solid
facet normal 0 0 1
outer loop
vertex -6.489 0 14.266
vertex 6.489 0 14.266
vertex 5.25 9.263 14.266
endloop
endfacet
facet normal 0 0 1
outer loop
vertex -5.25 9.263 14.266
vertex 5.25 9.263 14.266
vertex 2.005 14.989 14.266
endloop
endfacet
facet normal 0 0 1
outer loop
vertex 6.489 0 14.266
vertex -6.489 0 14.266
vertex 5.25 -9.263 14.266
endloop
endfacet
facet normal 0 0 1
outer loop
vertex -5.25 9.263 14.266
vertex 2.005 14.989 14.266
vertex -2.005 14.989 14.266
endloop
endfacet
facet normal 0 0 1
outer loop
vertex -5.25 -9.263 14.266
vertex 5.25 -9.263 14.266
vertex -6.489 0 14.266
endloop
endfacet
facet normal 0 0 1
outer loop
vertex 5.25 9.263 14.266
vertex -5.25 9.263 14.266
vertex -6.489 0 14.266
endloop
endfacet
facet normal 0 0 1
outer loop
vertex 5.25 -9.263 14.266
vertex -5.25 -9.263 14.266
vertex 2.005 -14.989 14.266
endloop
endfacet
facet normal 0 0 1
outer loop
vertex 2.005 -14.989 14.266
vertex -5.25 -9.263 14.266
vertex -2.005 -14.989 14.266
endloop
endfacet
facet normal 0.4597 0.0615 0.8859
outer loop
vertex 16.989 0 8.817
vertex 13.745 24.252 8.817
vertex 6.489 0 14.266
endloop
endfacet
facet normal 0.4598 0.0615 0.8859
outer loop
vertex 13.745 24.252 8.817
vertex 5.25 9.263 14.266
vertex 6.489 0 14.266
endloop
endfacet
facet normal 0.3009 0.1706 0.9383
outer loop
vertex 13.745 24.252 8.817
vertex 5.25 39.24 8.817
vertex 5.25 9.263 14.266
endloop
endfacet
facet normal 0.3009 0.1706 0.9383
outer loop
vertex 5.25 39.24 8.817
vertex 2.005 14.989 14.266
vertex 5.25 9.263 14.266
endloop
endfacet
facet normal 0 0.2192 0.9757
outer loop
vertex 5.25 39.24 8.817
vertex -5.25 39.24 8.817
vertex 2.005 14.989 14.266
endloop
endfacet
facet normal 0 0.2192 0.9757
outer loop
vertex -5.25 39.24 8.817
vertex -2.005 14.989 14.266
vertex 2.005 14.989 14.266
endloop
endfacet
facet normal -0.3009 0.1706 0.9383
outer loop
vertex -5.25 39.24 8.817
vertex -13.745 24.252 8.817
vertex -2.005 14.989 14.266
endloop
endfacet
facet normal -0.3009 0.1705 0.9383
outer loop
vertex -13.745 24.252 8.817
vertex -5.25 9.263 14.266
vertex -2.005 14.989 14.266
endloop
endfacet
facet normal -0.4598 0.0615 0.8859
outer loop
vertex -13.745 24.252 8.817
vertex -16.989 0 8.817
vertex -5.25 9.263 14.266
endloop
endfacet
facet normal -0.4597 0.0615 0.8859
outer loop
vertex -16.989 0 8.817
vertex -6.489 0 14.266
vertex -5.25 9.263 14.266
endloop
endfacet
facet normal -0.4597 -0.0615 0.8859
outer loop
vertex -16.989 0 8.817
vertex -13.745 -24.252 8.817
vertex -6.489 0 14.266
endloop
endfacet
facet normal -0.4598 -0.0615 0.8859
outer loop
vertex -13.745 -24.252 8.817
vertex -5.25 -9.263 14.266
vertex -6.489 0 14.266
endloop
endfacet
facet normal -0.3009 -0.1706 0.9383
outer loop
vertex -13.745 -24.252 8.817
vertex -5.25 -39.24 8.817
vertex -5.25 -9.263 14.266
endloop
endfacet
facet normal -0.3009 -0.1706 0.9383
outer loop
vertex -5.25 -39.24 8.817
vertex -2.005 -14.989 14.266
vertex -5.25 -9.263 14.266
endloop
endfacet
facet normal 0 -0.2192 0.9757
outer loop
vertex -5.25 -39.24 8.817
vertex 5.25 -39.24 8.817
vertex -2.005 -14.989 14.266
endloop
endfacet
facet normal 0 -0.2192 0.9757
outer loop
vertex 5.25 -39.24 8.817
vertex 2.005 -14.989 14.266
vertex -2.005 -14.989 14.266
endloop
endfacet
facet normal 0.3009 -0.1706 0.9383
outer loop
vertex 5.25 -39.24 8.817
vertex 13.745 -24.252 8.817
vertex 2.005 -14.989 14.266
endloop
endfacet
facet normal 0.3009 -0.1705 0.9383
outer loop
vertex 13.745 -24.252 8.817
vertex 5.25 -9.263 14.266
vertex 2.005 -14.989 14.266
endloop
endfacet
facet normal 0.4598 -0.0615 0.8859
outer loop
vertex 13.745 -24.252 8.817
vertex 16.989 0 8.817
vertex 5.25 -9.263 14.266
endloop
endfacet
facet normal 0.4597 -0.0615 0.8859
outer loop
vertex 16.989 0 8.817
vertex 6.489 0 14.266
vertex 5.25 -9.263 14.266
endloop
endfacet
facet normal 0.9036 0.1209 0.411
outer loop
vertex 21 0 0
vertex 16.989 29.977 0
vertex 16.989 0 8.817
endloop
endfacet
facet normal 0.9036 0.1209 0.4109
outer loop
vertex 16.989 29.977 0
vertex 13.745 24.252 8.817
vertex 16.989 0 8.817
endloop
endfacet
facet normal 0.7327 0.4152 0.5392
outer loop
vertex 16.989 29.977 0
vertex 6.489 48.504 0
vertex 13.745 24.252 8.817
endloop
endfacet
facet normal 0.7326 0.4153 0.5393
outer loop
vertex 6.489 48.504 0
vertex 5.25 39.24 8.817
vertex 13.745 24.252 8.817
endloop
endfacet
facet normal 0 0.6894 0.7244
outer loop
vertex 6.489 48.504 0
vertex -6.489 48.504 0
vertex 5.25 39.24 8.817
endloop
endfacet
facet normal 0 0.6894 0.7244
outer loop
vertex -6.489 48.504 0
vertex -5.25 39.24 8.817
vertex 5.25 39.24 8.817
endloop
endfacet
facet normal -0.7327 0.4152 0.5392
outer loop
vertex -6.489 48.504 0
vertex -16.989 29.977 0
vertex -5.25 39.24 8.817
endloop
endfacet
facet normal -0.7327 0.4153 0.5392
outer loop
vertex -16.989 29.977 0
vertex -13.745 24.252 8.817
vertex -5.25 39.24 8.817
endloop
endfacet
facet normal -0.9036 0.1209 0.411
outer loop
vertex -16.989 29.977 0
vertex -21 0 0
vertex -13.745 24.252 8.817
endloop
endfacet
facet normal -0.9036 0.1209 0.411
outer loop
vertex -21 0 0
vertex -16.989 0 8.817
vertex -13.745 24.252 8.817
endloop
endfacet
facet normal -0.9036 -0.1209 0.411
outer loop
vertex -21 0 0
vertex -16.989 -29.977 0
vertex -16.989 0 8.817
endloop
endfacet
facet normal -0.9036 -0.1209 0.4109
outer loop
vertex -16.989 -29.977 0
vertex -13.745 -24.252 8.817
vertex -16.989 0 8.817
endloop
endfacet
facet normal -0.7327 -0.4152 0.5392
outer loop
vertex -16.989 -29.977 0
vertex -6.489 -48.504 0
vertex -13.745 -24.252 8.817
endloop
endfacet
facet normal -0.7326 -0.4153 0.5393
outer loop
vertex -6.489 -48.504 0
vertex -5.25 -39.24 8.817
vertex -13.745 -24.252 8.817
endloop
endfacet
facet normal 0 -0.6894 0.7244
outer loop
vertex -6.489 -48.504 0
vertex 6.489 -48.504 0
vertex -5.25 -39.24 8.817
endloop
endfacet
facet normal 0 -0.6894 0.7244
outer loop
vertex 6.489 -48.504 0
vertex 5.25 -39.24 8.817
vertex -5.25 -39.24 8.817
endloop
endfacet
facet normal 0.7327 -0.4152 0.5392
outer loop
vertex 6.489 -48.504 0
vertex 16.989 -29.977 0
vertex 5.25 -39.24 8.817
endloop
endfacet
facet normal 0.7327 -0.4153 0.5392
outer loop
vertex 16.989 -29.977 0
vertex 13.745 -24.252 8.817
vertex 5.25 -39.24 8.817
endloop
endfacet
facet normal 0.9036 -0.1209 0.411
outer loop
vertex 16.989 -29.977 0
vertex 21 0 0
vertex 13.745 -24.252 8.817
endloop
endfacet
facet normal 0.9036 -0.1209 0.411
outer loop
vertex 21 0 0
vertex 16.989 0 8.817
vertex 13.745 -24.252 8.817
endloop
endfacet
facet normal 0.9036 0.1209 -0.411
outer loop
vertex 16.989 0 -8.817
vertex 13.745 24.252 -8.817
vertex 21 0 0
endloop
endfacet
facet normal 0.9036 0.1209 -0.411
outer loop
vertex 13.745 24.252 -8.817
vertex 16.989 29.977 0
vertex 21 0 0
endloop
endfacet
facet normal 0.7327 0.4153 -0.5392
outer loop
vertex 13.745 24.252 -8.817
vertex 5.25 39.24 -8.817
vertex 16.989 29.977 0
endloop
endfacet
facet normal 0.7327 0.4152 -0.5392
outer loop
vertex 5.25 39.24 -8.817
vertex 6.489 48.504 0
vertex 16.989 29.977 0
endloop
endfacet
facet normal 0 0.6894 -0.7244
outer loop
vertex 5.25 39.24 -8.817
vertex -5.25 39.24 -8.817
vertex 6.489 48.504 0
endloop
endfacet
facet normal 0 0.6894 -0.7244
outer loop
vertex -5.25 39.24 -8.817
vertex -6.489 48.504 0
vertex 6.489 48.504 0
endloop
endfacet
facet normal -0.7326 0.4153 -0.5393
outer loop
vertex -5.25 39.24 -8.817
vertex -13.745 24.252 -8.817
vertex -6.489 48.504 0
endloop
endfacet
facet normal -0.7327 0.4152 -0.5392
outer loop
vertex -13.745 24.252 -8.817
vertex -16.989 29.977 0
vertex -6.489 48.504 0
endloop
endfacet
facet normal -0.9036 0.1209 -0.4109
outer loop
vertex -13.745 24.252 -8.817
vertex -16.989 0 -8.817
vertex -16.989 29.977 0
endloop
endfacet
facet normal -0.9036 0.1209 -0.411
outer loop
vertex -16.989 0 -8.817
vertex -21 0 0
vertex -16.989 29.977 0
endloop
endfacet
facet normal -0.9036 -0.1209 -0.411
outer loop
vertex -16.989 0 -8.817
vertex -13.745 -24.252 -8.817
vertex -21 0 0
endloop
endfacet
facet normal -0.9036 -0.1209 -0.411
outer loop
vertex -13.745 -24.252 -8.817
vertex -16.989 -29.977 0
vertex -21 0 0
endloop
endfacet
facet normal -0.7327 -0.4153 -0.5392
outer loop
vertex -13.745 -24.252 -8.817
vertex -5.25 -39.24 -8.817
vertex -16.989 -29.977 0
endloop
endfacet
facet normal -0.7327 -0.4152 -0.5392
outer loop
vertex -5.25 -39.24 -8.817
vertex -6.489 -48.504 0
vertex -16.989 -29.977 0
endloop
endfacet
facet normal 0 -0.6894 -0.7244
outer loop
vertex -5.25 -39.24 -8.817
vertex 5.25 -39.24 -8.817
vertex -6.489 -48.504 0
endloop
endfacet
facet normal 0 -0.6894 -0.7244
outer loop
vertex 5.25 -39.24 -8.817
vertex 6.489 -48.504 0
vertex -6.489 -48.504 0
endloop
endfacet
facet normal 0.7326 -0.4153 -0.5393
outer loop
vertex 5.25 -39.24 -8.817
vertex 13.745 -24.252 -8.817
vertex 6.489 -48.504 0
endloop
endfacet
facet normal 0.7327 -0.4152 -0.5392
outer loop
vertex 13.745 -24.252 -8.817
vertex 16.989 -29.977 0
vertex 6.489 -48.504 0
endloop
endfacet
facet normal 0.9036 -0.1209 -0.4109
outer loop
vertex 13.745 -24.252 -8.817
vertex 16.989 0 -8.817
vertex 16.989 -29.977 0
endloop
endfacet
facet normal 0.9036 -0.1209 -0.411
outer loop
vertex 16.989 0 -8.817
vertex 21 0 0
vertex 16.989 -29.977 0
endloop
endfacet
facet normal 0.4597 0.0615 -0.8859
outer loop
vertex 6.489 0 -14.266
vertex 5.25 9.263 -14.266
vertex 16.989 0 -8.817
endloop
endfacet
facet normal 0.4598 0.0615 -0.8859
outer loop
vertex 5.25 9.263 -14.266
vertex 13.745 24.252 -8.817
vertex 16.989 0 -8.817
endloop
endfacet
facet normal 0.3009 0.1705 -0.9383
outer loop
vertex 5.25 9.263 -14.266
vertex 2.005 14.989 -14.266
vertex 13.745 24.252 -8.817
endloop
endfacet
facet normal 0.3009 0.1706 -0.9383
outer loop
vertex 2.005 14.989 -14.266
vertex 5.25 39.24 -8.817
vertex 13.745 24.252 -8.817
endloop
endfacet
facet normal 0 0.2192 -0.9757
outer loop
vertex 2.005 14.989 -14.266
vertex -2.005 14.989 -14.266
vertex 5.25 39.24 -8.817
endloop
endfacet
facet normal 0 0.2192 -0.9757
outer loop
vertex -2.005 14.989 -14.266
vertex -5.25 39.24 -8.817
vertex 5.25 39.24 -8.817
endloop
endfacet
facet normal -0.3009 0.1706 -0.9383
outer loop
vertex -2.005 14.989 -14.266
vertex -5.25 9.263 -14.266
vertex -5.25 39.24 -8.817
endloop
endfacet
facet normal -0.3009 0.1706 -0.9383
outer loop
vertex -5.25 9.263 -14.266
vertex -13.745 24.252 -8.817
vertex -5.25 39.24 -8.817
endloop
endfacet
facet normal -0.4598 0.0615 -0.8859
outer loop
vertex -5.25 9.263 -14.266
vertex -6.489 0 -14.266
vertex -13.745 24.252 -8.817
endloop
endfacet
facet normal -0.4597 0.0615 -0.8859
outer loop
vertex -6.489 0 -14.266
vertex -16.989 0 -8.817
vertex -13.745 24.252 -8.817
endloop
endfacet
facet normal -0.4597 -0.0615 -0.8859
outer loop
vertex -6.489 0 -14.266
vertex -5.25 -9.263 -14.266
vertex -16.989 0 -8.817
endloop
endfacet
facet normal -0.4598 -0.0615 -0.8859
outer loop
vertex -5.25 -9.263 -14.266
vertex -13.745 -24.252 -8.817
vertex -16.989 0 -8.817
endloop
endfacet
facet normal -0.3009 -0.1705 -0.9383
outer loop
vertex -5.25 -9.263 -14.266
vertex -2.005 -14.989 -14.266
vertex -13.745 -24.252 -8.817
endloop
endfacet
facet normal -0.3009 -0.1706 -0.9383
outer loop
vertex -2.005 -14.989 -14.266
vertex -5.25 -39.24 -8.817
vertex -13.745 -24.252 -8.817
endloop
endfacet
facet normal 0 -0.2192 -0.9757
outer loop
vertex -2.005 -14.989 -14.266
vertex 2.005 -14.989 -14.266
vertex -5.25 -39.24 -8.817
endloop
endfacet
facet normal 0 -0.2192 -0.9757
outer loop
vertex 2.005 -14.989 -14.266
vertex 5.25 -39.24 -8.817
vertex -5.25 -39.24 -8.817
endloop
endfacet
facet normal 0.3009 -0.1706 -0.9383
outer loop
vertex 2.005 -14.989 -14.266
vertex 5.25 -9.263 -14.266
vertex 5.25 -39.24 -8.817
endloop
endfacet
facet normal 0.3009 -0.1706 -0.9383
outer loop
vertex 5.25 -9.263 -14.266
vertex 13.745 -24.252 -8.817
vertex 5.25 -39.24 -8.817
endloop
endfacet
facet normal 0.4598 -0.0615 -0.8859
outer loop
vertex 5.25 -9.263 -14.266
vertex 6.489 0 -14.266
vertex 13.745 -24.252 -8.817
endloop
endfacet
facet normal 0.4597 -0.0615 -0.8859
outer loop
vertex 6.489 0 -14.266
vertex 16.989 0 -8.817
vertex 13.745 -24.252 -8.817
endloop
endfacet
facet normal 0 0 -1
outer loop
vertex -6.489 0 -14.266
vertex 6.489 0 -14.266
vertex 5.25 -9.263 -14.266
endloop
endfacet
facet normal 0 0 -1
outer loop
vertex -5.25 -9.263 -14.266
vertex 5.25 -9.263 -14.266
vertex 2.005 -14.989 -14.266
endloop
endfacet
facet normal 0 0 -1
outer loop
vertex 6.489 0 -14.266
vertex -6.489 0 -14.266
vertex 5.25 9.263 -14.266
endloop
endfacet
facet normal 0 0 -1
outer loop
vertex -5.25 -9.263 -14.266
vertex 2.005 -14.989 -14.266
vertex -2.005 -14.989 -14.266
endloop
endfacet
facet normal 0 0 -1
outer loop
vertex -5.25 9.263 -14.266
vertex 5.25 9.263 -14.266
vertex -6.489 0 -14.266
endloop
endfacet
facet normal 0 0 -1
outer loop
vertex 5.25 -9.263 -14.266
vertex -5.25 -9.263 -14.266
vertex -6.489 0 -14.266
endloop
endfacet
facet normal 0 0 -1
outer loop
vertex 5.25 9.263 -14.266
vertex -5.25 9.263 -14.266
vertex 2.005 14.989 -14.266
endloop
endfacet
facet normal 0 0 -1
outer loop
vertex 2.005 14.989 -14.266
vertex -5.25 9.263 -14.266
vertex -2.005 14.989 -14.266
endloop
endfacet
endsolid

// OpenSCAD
// Generated by SolidPython 1.0.1 on 2020-07-29 00:46:48


scale(v = [7, 17, 5]) {
	sphere(r = 3);
}
/***********************************************
*********      SolidPython code:      **********
************************************************
 
# import packages: SolidPython
from solid import *
from solid.utils import *
from itertools import chain, combinations, permutations


class Resize:

    def __init__(self, scad_file):
        self.scad_file = scad_file
        #self.scad_file = import_scad(scad_file)
        # cone/cylinder param:
        self.r1 = 0
        self.r2 = 0
        self.h = 0
        # rectangular prism param:
        self.w = 0
        self.l = 0
        # ellipse param:
        self.r = 0

    # import OpenScad code (file name corresponds to shape)


    # classify shape + parameters
    def assign(self, param1, param2, param3):
        if self.scad_file == 'cone.scad':
            self.r1 = param1
            self.r2 = param2
            self.h = param3
        elif self.scad_file == 'cylinder.scad':
            self.r1 = param1
            self.r2 = param2
            self.h = param3
        elif self.scad_file == 'rectangularPrism.scad':
            self.h = param1
            self.l = param2
            self.w = param3
        else:
            self.r = param1
            self.h = param2

    # resize parameters
    def iterate(self):
        x = range(3, 20, 2)
        i = 1
        if self.scad_file == 'cone.scad':
            tempList = list(permutations(x, 2))
            for temp in tempList:
                param1 = temp[0]
                param2 = temp[1]
                filepath = 'produced_scad_files/' + 'cone' + str(param1) + '_' + str(param2) + '_' + '.scad'
                scad_render_to_file(cylinder(h=param1, r1=param2, r2=0), filepath)

        elif self.scad_file == 'cylinder.scad':
            tempList = list(permutations(x, 3))
            for temp in tempList:
                param1 = temp[0]
                param2 = temp[1]
                filepath = 'produced_scad_files/' + 'cylinder' + str(param1) + '_' + str(param2) + '_' + '.scad'
                scad_render_to_file(cylinder(h=param1, r1=param2, r2=param2), filepath)

        elif self.scad_file == 'rectangularPrism.scad':
            tempList = list(permutations(x, 3))
            for temp in tempList:
                param1 = temp[0]
                param2 = temp[1]
                param3 = temp[2]
                filepath = 'produced_scad_files/' + 'rectangularPrism' + str(param1) + '_' + str(param2) + '_' + str(
                    param3) + '.scad'
                scad_render_to_file(cube(size=(param1, param2, param3)), filepath)

        elif self.scad_file == 'ellipse.scad':
            tempList = list(permutations(x, 4))
            for temp in tempList:
                param1 = temp[0]
                param2 = temp[1]
                param3 = temp[2]
                param4 = temp[3]
                filepath = 'produced_scad_files/' + 'ellipse' + str(param1) + '_' + str(param2) + '_' + str(param3) + '_' + str(param4) + '.scad'
                scad_render_to_file(scale([param1, param2, param3])(sphere(r=param4)), filepath)

    def render_to_scadfile(self):
        scad_render_to_file(scad, 'example.scad') 
 
************************************************/
